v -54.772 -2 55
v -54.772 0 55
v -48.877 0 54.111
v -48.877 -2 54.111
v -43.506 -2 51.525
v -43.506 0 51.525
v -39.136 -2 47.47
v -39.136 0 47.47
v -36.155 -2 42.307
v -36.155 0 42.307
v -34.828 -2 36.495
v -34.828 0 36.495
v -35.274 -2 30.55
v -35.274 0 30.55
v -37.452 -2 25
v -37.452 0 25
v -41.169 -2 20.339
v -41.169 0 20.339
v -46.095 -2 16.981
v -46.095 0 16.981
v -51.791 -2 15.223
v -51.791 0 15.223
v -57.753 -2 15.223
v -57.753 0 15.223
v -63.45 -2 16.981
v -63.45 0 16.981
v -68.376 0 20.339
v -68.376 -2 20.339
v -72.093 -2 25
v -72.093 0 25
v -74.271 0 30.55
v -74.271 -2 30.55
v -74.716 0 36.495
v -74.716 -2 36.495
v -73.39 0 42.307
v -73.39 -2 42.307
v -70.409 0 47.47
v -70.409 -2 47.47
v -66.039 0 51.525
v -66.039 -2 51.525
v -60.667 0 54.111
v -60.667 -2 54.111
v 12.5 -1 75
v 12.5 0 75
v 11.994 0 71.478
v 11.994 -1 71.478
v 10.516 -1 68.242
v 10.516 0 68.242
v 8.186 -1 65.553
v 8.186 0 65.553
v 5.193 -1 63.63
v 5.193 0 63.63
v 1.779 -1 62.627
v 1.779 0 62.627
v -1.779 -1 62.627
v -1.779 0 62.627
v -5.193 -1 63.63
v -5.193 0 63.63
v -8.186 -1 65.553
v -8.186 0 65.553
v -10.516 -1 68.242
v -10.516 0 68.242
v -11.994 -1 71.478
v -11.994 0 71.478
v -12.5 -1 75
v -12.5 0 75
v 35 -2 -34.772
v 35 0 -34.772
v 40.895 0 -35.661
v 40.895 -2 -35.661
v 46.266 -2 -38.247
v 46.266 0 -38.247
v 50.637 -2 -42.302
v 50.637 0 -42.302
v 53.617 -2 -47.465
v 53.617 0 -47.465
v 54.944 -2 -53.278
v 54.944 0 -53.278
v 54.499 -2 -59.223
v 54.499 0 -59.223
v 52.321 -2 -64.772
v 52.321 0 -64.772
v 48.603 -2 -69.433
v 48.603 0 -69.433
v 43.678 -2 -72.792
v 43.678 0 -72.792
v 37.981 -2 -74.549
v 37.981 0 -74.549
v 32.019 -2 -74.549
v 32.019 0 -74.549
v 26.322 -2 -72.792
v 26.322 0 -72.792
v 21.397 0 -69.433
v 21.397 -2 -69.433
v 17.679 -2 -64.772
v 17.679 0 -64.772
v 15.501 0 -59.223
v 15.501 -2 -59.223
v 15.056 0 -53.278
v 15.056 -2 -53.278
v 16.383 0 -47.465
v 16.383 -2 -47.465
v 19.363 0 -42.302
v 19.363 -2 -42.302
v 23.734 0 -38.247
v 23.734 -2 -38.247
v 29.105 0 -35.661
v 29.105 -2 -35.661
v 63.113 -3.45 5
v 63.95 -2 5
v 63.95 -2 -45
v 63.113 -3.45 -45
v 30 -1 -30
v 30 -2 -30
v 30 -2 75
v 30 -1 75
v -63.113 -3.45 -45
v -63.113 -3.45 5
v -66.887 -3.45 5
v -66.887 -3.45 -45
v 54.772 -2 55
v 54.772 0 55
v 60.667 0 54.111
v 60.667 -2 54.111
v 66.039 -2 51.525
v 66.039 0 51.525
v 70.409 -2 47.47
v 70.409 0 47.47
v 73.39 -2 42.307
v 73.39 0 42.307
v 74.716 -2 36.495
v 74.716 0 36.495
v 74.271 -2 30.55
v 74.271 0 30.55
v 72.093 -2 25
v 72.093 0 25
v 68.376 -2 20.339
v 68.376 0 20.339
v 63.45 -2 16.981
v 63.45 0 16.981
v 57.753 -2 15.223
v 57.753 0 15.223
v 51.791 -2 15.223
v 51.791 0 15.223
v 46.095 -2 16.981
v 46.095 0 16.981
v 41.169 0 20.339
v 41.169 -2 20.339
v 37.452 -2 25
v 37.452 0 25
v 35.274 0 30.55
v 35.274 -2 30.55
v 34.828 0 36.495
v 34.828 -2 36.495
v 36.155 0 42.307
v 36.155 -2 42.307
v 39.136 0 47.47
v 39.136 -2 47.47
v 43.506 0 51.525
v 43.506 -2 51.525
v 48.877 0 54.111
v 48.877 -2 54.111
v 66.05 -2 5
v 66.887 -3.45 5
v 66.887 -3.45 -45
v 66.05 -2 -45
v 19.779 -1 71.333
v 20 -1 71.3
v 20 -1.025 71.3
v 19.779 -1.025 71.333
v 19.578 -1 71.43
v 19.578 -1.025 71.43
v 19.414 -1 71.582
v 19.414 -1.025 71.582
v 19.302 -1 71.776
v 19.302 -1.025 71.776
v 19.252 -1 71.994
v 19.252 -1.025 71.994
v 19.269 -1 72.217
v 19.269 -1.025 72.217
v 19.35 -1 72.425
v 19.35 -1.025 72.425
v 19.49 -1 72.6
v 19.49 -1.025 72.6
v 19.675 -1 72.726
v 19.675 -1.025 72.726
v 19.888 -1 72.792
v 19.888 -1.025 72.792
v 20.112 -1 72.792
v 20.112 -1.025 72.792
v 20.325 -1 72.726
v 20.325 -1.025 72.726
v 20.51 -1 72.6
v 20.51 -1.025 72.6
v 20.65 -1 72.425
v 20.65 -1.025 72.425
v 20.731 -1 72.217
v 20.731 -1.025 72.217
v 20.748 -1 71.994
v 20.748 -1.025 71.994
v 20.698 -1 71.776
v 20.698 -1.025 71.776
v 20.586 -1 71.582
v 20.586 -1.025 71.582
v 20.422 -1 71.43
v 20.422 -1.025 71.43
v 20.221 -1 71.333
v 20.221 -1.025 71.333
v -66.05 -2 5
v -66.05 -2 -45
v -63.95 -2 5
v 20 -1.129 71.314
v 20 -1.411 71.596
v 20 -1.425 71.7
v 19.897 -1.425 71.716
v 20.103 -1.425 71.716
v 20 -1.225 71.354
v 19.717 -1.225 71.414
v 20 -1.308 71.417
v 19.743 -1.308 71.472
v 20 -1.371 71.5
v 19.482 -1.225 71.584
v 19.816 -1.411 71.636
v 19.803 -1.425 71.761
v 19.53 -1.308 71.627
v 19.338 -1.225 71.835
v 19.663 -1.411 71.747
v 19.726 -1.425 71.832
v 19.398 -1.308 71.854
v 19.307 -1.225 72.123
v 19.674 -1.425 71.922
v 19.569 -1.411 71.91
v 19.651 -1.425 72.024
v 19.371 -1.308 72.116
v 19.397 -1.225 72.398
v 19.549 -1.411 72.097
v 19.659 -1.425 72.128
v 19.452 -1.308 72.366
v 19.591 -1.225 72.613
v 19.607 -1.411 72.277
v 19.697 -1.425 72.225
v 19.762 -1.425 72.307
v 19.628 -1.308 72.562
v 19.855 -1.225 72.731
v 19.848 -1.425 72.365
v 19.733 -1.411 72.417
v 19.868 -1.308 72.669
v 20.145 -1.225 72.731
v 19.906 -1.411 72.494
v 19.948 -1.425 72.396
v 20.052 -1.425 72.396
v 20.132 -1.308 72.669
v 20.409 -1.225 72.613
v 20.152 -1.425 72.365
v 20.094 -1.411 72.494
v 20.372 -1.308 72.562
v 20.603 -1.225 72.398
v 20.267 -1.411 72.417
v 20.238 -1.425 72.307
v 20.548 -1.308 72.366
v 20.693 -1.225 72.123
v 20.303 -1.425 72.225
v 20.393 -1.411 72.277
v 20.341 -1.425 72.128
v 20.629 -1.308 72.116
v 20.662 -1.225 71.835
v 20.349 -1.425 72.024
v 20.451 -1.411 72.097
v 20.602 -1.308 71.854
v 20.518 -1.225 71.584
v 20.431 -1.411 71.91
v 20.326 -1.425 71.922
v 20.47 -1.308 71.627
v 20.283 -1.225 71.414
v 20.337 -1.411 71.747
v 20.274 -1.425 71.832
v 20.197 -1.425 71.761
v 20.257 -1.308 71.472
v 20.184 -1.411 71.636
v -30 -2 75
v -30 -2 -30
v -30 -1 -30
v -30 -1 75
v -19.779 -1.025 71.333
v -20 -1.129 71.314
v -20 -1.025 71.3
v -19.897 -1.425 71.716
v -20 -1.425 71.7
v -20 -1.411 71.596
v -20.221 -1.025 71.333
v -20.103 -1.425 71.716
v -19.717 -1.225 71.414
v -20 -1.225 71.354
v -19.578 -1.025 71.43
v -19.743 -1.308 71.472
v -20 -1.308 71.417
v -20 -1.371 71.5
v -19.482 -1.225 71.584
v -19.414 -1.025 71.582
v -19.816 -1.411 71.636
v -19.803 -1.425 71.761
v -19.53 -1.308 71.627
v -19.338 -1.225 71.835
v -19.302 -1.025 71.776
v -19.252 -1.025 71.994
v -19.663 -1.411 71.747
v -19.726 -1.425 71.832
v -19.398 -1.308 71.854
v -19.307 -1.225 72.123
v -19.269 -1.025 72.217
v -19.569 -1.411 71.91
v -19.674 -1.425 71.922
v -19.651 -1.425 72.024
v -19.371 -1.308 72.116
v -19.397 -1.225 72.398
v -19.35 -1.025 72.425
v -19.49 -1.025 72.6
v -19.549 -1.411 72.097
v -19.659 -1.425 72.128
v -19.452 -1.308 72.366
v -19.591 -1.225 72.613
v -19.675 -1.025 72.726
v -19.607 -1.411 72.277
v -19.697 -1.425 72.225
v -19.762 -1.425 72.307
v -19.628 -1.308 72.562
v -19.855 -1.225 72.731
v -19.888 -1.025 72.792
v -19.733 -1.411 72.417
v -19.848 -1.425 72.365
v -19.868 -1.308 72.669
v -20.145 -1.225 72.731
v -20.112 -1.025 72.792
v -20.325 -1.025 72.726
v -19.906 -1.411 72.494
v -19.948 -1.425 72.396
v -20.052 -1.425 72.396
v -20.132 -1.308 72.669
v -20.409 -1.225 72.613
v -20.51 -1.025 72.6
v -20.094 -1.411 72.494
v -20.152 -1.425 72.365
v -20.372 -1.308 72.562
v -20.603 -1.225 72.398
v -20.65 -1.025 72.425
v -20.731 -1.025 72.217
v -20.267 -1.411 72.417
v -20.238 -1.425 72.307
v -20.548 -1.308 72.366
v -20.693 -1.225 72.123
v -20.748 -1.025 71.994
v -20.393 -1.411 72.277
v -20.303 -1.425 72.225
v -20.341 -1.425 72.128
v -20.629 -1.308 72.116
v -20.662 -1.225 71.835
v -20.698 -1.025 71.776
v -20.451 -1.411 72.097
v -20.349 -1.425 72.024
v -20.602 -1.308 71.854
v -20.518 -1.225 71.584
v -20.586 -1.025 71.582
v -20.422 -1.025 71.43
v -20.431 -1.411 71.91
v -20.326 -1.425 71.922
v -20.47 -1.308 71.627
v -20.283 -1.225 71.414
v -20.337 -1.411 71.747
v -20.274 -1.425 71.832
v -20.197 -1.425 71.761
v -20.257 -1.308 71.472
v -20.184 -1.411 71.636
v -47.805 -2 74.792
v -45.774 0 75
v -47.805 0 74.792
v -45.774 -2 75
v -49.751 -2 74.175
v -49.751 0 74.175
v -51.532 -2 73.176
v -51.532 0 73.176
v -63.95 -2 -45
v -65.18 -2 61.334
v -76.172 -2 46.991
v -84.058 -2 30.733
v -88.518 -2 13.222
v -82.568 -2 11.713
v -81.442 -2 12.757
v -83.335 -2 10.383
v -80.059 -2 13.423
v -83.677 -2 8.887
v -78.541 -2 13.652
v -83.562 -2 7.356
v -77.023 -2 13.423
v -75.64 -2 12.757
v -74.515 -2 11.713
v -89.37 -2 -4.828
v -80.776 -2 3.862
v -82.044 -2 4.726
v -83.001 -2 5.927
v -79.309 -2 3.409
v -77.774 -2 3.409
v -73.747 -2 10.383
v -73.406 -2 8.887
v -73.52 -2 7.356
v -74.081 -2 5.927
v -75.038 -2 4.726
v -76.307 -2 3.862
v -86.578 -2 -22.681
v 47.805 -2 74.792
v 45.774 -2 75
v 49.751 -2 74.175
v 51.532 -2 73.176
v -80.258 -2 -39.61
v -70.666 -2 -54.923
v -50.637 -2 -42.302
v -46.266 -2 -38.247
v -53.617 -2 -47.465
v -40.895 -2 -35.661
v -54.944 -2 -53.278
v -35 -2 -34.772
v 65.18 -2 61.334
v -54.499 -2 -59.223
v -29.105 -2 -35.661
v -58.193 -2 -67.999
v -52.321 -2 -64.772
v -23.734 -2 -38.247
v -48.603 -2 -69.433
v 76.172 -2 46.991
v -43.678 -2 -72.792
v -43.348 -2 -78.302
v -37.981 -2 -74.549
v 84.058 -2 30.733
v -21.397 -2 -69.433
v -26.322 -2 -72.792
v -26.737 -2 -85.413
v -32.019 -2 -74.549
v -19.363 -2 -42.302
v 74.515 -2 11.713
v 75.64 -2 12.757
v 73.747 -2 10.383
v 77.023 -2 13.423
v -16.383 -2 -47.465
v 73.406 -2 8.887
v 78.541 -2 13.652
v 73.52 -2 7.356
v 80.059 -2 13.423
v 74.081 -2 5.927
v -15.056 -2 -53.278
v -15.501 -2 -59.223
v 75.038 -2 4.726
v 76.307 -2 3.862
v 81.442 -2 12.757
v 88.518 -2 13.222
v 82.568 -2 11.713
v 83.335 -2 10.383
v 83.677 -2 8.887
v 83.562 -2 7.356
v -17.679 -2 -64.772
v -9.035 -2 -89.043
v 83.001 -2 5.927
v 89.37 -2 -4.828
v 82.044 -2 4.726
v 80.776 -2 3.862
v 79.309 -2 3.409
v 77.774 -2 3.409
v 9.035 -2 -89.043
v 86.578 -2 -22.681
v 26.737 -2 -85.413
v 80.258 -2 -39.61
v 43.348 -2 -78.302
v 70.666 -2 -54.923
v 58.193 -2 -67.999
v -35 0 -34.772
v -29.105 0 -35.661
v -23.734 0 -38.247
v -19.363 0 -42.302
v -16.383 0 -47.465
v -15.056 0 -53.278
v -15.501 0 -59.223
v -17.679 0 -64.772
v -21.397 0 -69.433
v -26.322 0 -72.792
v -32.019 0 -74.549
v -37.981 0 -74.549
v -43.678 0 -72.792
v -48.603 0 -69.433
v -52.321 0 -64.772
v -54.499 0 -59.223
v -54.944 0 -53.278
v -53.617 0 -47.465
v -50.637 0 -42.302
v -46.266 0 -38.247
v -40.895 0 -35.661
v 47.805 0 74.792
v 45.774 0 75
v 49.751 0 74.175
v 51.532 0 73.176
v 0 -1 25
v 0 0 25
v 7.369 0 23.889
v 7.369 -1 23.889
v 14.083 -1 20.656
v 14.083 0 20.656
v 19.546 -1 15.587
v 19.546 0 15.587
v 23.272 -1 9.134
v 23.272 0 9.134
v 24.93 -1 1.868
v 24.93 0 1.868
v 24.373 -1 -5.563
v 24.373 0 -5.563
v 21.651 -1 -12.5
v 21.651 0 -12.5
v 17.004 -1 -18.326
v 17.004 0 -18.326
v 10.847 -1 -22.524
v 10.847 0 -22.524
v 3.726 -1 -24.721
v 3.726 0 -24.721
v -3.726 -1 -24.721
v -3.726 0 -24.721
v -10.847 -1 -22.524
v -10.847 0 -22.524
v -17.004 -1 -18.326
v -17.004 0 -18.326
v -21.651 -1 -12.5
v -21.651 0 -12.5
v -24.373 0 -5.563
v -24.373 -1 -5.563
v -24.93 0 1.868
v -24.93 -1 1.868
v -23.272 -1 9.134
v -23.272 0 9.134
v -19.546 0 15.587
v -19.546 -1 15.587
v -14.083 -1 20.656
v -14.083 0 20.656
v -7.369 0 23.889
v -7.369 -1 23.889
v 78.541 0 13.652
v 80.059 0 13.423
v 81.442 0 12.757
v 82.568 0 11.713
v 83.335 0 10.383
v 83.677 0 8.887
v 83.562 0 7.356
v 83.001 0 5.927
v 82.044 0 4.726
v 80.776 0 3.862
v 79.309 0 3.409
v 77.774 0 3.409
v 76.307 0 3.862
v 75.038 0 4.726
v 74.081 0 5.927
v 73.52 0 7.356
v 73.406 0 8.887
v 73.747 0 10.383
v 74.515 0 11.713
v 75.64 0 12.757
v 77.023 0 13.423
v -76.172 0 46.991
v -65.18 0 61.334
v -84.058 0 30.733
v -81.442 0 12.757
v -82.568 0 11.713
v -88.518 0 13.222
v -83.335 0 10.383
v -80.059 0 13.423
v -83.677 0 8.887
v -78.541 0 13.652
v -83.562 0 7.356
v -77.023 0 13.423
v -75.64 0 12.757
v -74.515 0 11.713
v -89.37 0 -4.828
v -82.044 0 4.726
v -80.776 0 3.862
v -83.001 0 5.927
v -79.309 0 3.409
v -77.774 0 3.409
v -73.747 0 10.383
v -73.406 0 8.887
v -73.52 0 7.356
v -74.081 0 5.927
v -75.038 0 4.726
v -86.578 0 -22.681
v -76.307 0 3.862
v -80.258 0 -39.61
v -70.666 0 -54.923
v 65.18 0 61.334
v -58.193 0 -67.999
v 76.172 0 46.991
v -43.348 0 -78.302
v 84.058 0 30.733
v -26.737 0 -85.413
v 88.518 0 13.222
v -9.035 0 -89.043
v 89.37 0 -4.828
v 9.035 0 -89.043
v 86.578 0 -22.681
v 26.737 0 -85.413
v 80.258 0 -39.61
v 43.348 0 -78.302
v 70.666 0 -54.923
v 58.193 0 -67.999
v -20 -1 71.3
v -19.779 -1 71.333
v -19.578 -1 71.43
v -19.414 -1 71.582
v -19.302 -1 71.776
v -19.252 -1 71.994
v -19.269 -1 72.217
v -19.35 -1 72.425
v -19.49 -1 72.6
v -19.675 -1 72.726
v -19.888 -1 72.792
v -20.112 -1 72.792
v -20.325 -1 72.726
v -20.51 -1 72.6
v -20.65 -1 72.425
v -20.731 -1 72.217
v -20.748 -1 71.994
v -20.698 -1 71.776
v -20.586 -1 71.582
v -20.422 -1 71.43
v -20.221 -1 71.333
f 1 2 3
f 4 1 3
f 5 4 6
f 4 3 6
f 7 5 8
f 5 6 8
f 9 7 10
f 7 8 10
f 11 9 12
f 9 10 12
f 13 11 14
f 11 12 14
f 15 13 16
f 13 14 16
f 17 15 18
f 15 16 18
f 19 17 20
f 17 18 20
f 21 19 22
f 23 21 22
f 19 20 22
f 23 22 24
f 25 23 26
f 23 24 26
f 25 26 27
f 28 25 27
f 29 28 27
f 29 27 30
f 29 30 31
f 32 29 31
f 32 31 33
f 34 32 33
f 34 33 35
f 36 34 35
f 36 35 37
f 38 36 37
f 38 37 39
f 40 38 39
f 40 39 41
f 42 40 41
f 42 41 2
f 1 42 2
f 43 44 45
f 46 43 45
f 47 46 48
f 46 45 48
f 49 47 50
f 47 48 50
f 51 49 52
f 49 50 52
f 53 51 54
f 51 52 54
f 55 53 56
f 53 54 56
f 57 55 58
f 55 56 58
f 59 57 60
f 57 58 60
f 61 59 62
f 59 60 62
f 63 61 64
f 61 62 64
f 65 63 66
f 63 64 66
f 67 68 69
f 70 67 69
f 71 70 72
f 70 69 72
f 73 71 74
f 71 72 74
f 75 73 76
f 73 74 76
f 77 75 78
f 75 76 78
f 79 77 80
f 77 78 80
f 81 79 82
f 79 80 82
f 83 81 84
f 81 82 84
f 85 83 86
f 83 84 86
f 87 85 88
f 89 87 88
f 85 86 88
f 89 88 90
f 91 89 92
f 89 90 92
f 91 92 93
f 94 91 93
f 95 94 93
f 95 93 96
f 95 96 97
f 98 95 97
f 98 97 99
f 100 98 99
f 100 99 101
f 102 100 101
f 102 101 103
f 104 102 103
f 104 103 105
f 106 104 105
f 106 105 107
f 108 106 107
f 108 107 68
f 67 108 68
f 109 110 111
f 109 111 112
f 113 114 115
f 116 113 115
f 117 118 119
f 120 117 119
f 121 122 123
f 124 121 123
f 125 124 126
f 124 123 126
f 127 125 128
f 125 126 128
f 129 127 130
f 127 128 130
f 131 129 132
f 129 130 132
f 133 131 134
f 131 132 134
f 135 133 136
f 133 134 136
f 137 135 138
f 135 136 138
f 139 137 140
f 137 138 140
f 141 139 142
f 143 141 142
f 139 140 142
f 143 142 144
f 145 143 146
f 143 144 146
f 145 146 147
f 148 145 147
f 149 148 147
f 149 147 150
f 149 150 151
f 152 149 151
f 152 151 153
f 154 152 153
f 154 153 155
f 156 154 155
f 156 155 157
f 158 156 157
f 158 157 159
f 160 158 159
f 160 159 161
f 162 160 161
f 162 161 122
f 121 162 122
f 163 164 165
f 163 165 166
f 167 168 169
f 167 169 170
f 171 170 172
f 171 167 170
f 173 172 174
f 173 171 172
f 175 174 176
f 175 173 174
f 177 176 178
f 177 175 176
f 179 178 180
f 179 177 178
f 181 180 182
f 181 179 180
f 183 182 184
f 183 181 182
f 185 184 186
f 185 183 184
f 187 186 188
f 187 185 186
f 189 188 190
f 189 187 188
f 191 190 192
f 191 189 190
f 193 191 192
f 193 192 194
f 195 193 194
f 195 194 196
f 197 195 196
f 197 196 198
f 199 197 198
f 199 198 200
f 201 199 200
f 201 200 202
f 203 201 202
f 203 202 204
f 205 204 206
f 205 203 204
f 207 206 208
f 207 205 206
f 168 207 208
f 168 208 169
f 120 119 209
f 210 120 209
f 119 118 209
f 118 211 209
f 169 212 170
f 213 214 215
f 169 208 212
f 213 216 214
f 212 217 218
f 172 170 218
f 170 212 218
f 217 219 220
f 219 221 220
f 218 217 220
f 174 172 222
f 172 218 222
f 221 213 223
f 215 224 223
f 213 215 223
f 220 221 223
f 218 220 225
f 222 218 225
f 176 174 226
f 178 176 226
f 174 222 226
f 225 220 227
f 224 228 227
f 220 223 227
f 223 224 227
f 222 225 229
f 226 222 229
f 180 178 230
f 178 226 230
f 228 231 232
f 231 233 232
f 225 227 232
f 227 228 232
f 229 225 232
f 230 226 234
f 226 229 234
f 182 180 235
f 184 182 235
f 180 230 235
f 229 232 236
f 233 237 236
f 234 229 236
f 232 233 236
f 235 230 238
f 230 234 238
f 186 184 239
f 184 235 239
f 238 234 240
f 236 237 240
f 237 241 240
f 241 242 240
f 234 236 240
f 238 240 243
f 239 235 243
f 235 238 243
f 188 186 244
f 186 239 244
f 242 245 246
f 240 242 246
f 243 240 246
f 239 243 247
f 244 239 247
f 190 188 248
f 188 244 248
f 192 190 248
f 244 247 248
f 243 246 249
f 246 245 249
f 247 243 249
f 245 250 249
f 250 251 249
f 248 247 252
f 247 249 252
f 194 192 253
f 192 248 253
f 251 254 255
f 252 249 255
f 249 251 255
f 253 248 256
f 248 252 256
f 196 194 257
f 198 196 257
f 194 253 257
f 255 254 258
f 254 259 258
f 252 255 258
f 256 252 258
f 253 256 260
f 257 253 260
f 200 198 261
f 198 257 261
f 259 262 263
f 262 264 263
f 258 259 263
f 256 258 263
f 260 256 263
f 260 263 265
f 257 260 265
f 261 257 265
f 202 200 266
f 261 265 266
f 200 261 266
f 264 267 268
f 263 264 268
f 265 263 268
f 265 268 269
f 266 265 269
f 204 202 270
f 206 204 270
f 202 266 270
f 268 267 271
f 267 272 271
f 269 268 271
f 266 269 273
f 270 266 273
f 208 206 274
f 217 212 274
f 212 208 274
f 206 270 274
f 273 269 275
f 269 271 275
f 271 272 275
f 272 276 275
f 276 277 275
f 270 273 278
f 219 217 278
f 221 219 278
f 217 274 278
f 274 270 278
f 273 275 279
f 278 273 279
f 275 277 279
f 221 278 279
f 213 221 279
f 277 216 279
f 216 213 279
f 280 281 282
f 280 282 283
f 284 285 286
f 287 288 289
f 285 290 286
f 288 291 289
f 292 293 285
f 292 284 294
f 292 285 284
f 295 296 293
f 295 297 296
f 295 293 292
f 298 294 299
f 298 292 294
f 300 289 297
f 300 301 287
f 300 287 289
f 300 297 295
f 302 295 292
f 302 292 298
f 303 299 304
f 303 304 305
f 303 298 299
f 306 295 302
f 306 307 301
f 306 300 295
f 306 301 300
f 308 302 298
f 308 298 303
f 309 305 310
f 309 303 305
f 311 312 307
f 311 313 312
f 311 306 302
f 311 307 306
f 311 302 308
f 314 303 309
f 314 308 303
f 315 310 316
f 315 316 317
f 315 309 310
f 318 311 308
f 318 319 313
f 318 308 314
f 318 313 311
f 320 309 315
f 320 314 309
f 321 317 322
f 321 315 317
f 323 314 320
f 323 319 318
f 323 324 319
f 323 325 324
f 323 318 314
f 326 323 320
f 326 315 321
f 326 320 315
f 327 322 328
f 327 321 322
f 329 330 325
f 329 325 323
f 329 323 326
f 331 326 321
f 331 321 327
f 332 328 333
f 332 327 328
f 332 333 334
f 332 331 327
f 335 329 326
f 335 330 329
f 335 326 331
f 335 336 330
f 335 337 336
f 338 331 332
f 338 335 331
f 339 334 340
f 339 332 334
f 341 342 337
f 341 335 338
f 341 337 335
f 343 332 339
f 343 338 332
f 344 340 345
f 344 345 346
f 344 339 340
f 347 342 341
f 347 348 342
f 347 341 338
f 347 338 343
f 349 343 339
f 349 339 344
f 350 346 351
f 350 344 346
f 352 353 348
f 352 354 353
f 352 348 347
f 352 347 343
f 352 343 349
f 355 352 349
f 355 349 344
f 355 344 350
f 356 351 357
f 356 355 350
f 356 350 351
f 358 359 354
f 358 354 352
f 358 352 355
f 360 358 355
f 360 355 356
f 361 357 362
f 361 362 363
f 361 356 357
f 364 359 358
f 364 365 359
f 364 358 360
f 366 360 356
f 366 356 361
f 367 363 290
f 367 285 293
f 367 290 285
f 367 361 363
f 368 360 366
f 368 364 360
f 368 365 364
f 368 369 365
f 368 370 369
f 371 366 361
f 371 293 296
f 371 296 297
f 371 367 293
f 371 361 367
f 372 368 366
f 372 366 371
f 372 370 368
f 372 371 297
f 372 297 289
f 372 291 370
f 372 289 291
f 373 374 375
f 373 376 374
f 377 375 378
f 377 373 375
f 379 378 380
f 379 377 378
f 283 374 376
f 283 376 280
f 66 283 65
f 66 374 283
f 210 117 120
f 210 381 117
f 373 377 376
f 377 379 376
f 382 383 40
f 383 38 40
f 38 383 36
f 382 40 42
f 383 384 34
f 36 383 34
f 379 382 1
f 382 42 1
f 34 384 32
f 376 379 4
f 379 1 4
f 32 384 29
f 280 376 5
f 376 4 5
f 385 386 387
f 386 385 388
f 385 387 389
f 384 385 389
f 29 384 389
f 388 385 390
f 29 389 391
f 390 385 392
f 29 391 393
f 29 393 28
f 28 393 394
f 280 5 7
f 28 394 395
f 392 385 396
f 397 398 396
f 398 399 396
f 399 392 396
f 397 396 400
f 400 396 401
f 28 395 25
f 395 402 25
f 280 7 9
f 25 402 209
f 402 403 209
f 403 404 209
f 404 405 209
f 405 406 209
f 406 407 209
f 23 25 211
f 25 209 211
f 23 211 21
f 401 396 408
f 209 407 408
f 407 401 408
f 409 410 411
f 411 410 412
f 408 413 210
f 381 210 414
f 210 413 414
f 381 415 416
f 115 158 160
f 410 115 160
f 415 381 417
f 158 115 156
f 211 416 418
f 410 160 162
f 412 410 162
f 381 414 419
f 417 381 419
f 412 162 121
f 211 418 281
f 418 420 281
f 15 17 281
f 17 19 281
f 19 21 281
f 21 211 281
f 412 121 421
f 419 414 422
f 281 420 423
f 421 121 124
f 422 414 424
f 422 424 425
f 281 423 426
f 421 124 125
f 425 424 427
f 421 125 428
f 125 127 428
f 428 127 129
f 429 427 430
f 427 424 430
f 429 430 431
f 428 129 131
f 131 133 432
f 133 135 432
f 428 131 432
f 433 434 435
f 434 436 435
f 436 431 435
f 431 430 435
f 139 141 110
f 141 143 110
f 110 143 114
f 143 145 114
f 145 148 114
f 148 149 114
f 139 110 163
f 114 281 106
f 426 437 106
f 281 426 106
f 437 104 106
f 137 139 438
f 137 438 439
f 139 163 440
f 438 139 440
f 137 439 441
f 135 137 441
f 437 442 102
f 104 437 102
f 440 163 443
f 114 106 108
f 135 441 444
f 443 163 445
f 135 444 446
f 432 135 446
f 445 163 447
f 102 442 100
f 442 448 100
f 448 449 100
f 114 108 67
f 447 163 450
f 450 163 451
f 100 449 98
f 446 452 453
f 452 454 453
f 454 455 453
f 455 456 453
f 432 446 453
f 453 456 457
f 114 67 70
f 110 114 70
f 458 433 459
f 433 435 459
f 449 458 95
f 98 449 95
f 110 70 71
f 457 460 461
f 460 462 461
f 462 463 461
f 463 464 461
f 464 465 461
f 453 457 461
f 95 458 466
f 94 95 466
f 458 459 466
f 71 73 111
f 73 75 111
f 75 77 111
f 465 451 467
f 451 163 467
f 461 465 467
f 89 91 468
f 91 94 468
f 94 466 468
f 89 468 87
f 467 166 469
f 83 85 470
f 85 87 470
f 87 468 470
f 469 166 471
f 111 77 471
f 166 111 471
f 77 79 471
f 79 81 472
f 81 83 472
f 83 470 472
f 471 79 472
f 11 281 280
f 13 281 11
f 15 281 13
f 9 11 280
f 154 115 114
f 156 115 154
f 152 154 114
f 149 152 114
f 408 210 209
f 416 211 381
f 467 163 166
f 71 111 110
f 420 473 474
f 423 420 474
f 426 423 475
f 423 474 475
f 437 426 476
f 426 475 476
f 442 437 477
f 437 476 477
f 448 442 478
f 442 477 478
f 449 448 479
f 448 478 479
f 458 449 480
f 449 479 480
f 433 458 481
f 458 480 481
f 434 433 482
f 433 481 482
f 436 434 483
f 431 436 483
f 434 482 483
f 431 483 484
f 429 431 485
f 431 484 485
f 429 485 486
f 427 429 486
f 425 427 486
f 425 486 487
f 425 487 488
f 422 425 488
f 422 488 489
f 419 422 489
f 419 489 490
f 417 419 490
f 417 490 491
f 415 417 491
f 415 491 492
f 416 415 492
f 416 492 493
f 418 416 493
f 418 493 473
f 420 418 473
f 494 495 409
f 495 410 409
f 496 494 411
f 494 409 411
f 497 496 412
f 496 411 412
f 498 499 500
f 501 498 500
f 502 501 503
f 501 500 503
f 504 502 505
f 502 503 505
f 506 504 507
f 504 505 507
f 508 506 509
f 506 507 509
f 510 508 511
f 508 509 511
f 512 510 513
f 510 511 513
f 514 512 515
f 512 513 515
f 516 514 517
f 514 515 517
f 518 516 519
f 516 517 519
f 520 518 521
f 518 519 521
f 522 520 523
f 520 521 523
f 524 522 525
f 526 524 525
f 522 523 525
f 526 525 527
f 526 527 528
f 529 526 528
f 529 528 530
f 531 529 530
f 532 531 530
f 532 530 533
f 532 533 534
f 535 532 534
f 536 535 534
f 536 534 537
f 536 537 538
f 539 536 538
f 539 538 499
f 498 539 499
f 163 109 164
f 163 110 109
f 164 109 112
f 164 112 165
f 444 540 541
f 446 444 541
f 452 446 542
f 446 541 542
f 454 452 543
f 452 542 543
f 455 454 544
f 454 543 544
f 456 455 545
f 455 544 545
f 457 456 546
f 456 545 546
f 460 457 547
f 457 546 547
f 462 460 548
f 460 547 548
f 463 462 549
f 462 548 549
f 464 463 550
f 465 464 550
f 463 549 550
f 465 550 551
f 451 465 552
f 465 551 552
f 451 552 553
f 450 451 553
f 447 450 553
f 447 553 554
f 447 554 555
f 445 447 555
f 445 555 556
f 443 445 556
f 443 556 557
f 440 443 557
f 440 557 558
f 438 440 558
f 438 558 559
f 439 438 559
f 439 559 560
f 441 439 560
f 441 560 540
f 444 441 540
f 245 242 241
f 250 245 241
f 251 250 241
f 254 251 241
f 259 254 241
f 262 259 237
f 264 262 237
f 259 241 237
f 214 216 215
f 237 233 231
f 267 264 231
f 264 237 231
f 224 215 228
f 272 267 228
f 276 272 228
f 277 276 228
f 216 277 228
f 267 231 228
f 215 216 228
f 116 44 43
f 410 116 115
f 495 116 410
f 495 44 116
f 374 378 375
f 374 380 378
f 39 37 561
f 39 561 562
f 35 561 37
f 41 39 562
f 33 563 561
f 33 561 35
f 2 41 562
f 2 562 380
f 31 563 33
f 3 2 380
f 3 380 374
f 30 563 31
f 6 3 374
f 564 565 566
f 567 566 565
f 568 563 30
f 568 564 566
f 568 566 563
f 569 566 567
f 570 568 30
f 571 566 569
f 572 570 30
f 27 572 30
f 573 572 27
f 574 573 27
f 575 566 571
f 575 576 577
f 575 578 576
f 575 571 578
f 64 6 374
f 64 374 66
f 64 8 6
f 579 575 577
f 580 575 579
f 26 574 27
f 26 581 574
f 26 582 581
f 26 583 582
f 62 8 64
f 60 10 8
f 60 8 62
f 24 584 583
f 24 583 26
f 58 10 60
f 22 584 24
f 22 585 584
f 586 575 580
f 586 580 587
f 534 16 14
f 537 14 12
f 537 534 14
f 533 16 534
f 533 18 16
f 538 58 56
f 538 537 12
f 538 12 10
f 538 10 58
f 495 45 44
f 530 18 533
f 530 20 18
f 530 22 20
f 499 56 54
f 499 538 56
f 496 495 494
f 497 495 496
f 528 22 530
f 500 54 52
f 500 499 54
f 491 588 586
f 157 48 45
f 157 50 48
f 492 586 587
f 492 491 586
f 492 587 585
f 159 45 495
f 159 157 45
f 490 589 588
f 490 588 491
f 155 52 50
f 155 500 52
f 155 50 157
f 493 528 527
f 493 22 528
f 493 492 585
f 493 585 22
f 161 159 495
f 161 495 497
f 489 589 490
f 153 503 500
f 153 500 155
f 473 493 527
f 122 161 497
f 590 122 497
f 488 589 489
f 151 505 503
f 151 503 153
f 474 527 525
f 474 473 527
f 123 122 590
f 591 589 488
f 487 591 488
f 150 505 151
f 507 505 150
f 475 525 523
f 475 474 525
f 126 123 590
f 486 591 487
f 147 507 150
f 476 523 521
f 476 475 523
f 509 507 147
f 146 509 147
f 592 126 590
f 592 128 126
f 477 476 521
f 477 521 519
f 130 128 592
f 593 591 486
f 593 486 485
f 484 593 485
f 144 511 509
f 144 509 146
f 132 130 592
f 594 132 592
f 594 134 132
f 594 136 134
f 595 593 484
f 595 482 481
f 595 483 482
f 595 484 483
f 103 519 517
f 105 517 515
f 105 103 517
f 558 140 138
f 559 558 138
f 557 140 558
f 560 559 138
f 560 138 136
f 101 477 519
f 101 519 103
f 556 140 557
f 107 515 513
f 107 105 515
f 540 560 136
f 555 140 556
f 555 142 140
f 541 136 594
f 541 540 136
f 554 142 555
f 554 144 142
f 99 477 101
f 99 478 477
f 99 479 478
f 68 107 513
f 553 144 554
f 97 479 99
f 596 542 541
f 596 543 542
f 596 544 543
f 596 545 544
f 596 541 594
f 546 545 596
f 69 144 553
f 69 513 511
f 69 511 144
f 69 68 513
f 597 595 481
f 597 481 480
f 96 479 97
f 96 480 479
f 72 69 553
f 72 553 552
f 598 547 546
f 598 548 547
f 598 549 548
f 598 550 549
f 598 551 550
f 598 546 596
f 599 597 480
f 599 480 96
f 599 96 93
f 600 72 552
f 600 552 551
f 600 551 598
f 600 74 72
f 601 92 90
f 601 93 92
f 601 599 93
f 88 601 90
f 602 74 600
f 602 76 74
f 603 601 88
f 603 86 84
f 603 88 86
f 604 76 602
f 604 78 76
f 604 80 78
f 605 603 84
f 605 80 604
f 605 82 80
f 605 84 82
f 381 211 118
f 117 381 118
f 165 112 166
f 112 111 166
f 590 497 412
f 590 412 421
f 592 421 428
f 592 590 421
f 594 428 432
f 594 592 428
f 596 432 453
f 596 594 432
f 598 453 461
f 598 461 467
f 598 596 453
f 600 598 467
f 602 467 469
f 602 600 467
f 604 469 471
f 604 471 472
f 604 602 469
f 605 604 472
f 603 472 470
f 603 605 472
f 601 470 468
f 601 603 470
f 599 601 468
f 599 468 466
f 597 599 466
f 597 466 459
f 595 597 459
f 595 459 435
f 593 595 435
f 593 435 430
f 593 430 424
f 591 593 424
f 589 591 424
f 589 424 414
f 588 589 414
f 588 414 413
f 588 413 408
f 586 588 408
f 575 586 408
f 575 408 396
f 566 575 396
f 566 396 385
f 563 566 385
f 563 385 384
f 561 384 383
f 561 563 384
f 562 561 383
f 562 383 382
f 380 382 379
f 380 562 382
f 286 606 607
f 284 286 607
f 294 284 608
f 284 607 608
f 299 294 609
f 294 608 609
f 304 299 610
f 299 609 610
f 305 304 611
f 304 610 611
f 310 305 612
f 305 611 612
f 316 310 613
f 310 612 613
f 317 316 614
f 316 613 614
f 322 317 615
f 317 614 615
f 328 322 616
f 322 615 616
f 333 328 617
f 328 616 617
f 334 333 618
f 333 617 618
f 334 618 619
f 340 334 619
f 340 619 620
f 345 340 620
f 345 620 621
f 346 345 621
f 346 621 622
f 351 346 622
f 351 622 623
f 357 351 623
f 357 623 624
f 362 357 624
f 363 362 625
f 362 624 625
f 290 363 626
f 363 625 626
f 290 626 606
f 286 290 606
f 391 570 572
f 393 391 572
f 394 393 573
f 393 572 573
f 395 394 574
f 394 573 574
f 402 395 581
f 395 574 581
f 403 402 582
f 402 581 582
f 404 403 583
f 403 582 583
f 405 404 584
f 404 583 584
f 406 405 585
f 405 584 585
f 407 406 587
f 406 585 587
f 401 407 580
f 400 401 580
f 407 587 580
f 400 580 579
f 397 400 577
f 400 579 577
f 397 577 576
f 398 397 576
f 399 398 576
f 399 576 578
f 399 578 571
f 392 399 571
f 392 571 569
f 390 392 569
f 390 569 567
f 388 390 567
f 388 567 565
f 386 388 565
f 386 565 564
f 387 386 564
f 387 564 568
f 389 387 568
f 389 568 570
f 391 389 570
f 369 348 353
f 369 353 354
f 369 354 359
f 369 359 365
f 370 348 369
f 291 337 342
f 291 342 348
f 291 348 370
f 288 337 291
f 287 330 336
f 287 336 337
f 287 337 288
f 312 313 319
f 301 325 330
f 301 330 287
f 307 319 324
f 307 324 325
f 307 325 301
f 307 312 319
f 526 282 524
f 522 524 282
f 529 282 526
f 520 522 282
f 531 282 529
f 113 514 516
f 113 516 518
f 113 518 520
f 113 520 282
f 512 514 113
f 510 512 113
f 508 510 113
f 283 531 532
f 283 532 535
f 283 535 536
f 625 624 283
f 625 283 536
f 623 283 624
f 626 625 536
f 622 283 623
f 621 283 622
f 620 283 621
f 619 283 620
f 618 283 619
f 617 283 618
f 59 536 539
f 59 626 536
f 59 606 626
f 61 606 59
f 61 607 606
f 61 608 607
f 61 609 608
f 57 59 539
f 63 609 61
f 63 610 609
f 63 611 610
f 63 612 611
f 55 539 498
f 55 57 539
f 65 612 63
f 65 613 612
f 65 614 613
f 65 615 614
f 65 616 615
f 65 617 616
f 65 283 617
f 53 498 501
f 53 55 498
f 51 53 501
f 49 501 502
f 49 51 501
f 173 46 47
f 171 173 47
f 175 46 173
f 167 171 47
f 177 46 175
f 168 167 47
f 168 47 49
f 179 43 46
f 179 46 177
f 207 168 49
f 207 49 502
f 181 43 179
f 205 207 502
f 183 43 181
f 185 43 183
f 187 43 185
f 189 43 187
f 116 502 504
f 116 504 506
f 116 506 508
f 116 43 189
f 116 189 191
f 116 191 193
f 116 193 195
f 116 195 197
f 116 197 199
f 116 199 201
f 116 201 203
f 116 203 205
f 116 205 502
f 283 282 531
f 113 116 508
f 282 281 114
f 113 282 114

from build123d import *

# Parameters (mm, degrees)
BOSS_EXTRUDE1_DEPTH = 2
SKETCH9_R           = 5.15
CUT_EXTRUDE3_DEPTH  = 127.587914115
VISION_PATTERN_R    = 25
VISION_PATTERN_R_2  = 20
CUT_EXTRUDE4_DEPTH  = 127.587914115
FILLET1_R           = 10
BOSS_EXTRUDE4_DEPTH = 50
SKETCH12_W          = 60
SKETCH12_H          = 105
CUT_EXTRUDE5_DEPTH  = 1
SKETCH16_R          = 12.5
CUT_EXTRUDE9_DEPTH  = 20
SKETCH17_R          = 0.75
BOSS_EXTRUDE3_DEPTH = 0.425
FILLET2_R           = 0.4


with BuildPart() as part:
    # Sketch1 → Boss-Extrude1 (new body)
    with BuildSketch(Plane(origin=(0, 0, 0), x_dir=(1, 0, 0), z_dir=(0, 1, 0))):
        with BuildLine():
            Line((-48.839021284, -75), (48.839021284, -75))
            ThreePointArc((48.839021284, -75), (0, 89.5), (-48.839021284, -75))
        make_face()
    extrude(amount=-BOSS_EXTRUDE1_DEPTH)

    # Sketch9 → Cut-Extrude3 (cut, through all)
    with BuildSketch(Plane(origin=(0, 0, 0), x_dir=(1, 0, 0), z_dir=(0, 1, 0))):
        with Locations(Location((78.541209232, -8.501673503, 0), (0, 0, 270))):
            Circle(SKETCH9_R)
        with Locations(Location((-78.541209232, -8.501673503, 0), (0, 0, 270))):
            Circle(SKETCH9_R)
    extrude(amount=-CUT_EXTRUDE3_DEPTH, mode=Mode.SUBTRACT)

    # Vision Pattern → Cut-Extrude4 (cut, through all)
    with BuildSketch(Plane(origin=(0, 0, 0), x_dir=(1, 0, 0), z_dir=(0, 1, 0))):
        with Locations(Location((0, 0, 0), (0, 0, 270))):
            Circle(VISION_PATTERN_R)
        with Locations(Location((54.772255751, -35, 0), (0, 0, 270))):
            Circle(VISION_PATTERN_R_2)
        with Locations(Location((-54.772255751, -35, 0), (0, 0, 270))):
            Circle(VISION_PATTERN_R_2)
        with Locations(Location((35, 54.772255751, 0), (0, 0, 270))):
            Circle(VISION_PATTERN_R_2)
        with Locations(Location((-35, 54.772255751, 0), (0, 0, 270))):
            Circle(VISION_PATTERN_R_2)
    extrude(amount=-CUT_EXTRUDE4_DEPTH, mode=Mode.SUBTRACT)

    # Fillet1
    fillet1_edges = [part.edges().sort_by_distance(p)[0] for p in [
        (48.839021284, -1, 75),
        (-48.839021284, -1, 75),
    ]]
    fillet(fillet1_edges, radius=FILLET1_R)

    # Sketch18 → Boss-Extrude4 (add)
    with BuildSketch(Plane.XY.offset(5)):
        Polygon((63.11284211, -3.45), (66.88715789, -3.45), (66.05, -2), (63.95, -2), align=None)
    boss_extrude4 = extrude(amount=-BOSS_EXTRUDE4_DEPTH)

    # Mirror2: Boss-Extrude4 across plane
    add(boss_extrude4.mirror(Plane(origin=(0, 0, 0), x_dir=(0, 0, 1), z_dir=(1, 0, 0))))

    # Sketch12 → Cut-Extrude5 (cut)
    with BuildSketch(Plane.XZ.offset(2)):
        with Locations((0, 22.5)):
            Rectangle(SKETCH12_W, SKETCH12_H)
    extrude(amount=-CUT_EXTRUDE5_DEPTH, mode=Mode.SUBTRACT)

    # Sketch16 → Cut-Extrude9 (cut)
    with BuildSketch(Plane(origin=(0, 0, 0), x_dir=(1, 0, 0), z_dir=(0, 1, 0))):
        with Locations((0, -75)):
            Circle(SKETCH16_R)
    extrude(amount=-CUT_EXTRUDE9_DEPTH, mode=Mode.SUBTRACT)

    # Sketch17 → Boss-Extrude3 (add)
    with BuildSketch(Plane.XZ.offset(1)):
        with Locations(Location((-20, 72.05, 0), (0, 0, 270))):
            Circle(SKETCH17_R)
    boss_extrude3 = extrude(amount=BOSS_EXTRUDE3_DEPTH)

    # Mirror1: Boss-Extrude3 across plane
    add(boss_extrude3.mirror(Plane(origin=(0, 0, 0), x_dir=(0, 0, 1), z_dir=(1, 0, 0))))

    # Fillet2
    fillet2_edges = [part.edges().sort_by_distance(p)[0] for p in [
        (-20, -1.425, 72.8),
        (20, -1.425, 72.8),
    ]]
    fillet(fillet2_edges, radius=FILLET2_R)


solid = part.part
